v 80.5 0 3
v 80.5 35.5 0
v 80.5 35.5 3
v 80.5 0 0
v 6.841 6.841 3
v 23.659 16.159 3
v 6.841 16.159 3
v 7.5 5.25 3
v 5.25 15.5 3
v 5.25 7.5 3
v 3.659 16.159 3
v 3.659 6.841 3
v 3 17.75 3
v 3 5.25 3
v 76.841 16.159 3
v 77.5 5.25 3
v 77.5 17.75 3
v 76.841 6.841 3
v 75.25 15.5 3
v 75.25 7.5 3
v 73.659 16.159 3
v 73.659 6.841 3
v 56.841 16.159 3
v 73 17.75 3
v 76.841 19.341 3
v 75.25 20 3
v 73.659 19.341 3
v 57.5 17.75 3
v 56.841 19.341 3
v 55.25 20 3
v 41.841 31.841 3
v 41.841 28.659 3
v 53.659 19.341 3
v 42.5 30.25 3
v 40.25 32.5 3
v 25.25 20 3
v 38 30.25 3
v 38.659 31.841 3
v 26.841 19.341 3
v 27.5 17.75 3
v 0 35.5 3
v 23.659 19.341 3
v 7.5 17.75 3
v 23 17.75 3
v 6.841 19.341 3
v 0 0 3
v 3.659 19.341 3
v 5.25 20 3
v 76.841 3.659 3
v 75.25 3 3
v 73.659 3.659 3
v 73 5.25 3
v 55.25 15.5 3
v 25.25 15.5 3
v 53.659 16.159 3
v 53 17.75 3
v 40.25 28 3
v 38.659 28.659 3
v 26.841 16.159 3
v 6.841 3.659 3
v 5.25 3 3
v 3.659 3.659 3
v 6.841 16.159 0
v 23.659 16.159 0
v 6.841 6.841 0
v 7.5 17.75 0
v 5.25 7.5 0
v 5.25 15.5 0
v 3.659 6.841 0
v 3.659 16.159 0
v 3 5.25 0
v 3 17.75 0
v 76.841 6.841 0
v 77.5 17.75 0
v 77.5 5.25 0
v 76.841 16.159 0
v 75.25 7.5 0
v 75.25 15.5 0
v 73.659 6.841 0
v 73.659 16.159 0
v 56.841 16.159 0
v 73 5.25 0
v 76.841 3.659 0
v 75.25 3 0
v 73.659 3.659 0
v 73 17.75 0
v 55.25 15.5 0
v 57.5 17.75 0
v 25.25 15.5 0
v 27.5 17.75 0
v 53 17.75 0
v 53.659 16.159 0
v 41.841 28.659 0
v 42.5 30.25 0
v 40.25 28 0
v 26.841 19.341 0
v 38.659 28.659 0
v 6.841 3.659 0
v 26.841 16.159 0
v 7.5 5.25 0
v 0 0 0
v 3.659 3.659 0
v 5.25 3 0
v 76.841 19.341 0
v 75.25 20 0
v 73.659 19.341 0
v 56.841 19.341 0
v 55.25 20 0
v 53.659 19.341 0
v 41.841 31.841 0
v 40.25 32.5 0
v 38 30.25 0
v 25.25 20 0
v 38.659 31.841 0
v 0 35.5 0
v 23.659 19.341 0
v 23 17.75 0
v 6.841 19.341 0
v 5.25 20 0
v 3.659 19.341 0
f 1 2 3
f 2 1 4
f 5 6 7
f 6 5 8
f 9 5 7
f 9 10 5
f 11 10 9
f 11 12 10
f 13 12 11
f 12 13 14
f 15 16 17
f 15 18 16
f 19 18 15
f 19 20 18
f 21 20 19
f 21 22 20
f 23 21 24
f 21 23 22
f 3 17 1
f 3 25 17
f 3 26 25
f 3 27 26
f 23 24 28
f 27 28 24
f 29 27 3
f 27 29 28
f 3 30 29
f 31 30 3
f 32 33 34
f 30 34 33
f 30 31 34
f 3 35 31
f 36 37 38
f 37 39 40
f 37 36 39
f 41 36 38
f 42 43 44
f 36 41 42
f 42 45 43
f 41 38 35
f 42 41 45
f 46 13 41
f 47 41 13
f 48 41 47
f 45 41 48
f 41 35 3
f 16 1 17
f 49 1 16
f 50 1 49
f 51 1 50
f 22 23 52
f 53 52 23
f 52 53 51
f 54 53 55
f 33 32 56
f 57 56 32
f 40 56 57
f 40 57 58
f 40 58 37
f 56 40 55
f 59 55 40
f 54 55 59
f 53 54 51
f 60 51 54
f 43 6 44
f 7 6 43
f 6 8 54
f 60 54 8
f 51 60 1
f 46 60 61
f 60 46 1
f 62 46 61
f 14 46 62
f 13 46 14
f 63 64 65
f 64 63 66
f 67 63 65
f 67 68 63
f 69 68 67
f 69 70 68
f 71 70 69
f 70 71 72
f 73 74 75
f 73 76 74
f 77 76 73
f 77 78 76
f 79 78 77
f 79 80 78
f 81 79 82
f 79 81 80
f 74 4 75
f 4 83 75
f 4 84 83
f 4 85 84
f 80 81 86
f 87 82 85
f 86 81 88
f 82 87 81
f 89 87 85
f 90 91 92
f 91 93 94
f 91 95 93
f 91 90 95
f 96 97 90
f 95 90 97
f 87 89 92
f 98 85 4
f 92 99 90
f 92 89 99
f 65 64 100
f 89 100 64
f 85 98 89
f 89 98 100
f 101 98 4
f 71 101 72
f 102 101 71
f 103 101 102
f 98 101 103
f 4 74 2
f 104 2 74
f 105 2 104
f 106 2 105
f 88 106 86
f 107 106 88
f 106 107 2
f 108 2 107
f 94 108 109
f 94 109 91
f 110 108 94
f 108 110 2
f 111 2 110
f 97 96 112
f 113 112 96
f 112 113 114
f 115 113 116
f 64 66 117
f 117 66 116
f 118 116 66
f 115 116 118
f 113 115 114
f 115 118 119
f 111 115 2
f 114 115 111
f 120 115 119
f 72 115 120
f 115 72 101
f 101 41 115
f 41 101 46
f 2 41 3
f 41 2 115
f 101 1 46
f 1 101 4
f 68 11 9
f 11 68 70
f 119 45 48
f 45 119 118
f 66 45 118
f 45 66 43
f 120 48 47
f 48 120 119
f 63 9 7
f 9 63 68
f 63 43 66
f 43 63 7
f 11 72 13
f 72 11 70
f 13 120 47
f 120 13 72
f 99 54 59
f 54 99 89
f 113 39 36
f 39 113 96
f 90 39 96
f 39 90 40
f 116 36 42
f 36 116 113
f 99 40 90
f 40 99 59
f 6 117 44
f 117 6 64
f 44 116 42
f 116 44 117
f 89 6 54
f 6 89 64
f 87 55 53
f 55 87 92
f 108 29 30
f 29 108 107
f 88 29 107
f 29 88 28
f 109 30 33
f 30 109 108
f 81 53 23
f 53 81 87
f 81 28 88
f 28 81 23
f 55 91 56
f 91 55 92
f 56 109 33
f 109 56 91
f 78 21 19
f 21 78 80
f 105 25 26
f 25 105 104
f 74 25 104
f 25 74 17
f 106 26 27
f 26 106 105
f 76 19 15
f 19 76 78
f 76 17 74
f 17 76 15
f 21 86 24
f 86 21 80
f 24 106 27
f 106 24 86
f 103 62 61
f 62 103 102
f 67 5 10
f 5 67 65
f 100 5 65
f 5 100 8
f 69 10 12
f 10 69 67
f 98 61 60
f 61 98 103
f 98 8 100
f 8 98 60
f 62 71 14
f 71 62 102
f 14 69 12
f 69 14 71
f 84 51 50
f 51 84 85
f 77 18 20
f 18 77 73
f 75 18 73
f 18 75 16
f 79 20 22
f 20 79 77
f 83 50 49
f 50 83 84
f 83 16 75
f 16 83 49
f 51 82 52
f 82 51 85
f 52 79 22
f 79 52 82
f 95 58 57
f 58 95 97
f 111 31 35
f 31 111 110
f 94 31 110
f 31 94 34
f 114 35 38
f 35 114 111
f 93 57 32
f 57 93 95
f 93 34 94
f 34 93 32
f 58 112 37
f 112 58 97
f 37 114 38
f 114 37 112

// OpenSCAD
height = 3; //mm
squoojefactor = 1; //mm
screw = 3.5 + squoojefactor; //mm, ie a loose M3
wire = 1 + squoojefactor; //mm
thick = 3; //mm

length = 60; //mm

pairDistance = 20; //mm, distance between hole centres
armDistance = 30; //mm, distance between inner hole centres
width = 25;


difference(){
cube([pairDistance + armDistance + pairDistance + screw + (2*thick), width + screw + (2*thick), height]);

//arm holes
translate([thick + (screw/2), thick + (screw/2) + width/2, 0]) cylinder(h=height, d=screw);
translate([thick + (screw/2) + pairDistance, thick + (screw/2) + width / 2, 0]) cylinder(h=height, d=screw);
translate([pairDistance + armDistance + thick + (screw/2), thick + (screw/2) + width/2, 0]) cylinder(h=height, d=screw);
translate([pairDistance + armDistance + thick + (screw/2) + pairDistance, thick + (screw/2) + width / 2, 0]) cylinder(h=height, d=screw);

//mounting holes
translate([thick + (screw/2), thick + (screw/2), 0]) cylinder(h=height, d=screw);
translate([pairDistance + armDistance + pairDistance + thick + (screw/2), thick + (screw/2), 0]) cylinder(h=height, d=screw);
translate([(pairDistance + armDistance + pairDistance) / 2 + thick + (screw/2), thick + (screw/2) + width, 0]) cylinder(h=height, d=screw);

}
